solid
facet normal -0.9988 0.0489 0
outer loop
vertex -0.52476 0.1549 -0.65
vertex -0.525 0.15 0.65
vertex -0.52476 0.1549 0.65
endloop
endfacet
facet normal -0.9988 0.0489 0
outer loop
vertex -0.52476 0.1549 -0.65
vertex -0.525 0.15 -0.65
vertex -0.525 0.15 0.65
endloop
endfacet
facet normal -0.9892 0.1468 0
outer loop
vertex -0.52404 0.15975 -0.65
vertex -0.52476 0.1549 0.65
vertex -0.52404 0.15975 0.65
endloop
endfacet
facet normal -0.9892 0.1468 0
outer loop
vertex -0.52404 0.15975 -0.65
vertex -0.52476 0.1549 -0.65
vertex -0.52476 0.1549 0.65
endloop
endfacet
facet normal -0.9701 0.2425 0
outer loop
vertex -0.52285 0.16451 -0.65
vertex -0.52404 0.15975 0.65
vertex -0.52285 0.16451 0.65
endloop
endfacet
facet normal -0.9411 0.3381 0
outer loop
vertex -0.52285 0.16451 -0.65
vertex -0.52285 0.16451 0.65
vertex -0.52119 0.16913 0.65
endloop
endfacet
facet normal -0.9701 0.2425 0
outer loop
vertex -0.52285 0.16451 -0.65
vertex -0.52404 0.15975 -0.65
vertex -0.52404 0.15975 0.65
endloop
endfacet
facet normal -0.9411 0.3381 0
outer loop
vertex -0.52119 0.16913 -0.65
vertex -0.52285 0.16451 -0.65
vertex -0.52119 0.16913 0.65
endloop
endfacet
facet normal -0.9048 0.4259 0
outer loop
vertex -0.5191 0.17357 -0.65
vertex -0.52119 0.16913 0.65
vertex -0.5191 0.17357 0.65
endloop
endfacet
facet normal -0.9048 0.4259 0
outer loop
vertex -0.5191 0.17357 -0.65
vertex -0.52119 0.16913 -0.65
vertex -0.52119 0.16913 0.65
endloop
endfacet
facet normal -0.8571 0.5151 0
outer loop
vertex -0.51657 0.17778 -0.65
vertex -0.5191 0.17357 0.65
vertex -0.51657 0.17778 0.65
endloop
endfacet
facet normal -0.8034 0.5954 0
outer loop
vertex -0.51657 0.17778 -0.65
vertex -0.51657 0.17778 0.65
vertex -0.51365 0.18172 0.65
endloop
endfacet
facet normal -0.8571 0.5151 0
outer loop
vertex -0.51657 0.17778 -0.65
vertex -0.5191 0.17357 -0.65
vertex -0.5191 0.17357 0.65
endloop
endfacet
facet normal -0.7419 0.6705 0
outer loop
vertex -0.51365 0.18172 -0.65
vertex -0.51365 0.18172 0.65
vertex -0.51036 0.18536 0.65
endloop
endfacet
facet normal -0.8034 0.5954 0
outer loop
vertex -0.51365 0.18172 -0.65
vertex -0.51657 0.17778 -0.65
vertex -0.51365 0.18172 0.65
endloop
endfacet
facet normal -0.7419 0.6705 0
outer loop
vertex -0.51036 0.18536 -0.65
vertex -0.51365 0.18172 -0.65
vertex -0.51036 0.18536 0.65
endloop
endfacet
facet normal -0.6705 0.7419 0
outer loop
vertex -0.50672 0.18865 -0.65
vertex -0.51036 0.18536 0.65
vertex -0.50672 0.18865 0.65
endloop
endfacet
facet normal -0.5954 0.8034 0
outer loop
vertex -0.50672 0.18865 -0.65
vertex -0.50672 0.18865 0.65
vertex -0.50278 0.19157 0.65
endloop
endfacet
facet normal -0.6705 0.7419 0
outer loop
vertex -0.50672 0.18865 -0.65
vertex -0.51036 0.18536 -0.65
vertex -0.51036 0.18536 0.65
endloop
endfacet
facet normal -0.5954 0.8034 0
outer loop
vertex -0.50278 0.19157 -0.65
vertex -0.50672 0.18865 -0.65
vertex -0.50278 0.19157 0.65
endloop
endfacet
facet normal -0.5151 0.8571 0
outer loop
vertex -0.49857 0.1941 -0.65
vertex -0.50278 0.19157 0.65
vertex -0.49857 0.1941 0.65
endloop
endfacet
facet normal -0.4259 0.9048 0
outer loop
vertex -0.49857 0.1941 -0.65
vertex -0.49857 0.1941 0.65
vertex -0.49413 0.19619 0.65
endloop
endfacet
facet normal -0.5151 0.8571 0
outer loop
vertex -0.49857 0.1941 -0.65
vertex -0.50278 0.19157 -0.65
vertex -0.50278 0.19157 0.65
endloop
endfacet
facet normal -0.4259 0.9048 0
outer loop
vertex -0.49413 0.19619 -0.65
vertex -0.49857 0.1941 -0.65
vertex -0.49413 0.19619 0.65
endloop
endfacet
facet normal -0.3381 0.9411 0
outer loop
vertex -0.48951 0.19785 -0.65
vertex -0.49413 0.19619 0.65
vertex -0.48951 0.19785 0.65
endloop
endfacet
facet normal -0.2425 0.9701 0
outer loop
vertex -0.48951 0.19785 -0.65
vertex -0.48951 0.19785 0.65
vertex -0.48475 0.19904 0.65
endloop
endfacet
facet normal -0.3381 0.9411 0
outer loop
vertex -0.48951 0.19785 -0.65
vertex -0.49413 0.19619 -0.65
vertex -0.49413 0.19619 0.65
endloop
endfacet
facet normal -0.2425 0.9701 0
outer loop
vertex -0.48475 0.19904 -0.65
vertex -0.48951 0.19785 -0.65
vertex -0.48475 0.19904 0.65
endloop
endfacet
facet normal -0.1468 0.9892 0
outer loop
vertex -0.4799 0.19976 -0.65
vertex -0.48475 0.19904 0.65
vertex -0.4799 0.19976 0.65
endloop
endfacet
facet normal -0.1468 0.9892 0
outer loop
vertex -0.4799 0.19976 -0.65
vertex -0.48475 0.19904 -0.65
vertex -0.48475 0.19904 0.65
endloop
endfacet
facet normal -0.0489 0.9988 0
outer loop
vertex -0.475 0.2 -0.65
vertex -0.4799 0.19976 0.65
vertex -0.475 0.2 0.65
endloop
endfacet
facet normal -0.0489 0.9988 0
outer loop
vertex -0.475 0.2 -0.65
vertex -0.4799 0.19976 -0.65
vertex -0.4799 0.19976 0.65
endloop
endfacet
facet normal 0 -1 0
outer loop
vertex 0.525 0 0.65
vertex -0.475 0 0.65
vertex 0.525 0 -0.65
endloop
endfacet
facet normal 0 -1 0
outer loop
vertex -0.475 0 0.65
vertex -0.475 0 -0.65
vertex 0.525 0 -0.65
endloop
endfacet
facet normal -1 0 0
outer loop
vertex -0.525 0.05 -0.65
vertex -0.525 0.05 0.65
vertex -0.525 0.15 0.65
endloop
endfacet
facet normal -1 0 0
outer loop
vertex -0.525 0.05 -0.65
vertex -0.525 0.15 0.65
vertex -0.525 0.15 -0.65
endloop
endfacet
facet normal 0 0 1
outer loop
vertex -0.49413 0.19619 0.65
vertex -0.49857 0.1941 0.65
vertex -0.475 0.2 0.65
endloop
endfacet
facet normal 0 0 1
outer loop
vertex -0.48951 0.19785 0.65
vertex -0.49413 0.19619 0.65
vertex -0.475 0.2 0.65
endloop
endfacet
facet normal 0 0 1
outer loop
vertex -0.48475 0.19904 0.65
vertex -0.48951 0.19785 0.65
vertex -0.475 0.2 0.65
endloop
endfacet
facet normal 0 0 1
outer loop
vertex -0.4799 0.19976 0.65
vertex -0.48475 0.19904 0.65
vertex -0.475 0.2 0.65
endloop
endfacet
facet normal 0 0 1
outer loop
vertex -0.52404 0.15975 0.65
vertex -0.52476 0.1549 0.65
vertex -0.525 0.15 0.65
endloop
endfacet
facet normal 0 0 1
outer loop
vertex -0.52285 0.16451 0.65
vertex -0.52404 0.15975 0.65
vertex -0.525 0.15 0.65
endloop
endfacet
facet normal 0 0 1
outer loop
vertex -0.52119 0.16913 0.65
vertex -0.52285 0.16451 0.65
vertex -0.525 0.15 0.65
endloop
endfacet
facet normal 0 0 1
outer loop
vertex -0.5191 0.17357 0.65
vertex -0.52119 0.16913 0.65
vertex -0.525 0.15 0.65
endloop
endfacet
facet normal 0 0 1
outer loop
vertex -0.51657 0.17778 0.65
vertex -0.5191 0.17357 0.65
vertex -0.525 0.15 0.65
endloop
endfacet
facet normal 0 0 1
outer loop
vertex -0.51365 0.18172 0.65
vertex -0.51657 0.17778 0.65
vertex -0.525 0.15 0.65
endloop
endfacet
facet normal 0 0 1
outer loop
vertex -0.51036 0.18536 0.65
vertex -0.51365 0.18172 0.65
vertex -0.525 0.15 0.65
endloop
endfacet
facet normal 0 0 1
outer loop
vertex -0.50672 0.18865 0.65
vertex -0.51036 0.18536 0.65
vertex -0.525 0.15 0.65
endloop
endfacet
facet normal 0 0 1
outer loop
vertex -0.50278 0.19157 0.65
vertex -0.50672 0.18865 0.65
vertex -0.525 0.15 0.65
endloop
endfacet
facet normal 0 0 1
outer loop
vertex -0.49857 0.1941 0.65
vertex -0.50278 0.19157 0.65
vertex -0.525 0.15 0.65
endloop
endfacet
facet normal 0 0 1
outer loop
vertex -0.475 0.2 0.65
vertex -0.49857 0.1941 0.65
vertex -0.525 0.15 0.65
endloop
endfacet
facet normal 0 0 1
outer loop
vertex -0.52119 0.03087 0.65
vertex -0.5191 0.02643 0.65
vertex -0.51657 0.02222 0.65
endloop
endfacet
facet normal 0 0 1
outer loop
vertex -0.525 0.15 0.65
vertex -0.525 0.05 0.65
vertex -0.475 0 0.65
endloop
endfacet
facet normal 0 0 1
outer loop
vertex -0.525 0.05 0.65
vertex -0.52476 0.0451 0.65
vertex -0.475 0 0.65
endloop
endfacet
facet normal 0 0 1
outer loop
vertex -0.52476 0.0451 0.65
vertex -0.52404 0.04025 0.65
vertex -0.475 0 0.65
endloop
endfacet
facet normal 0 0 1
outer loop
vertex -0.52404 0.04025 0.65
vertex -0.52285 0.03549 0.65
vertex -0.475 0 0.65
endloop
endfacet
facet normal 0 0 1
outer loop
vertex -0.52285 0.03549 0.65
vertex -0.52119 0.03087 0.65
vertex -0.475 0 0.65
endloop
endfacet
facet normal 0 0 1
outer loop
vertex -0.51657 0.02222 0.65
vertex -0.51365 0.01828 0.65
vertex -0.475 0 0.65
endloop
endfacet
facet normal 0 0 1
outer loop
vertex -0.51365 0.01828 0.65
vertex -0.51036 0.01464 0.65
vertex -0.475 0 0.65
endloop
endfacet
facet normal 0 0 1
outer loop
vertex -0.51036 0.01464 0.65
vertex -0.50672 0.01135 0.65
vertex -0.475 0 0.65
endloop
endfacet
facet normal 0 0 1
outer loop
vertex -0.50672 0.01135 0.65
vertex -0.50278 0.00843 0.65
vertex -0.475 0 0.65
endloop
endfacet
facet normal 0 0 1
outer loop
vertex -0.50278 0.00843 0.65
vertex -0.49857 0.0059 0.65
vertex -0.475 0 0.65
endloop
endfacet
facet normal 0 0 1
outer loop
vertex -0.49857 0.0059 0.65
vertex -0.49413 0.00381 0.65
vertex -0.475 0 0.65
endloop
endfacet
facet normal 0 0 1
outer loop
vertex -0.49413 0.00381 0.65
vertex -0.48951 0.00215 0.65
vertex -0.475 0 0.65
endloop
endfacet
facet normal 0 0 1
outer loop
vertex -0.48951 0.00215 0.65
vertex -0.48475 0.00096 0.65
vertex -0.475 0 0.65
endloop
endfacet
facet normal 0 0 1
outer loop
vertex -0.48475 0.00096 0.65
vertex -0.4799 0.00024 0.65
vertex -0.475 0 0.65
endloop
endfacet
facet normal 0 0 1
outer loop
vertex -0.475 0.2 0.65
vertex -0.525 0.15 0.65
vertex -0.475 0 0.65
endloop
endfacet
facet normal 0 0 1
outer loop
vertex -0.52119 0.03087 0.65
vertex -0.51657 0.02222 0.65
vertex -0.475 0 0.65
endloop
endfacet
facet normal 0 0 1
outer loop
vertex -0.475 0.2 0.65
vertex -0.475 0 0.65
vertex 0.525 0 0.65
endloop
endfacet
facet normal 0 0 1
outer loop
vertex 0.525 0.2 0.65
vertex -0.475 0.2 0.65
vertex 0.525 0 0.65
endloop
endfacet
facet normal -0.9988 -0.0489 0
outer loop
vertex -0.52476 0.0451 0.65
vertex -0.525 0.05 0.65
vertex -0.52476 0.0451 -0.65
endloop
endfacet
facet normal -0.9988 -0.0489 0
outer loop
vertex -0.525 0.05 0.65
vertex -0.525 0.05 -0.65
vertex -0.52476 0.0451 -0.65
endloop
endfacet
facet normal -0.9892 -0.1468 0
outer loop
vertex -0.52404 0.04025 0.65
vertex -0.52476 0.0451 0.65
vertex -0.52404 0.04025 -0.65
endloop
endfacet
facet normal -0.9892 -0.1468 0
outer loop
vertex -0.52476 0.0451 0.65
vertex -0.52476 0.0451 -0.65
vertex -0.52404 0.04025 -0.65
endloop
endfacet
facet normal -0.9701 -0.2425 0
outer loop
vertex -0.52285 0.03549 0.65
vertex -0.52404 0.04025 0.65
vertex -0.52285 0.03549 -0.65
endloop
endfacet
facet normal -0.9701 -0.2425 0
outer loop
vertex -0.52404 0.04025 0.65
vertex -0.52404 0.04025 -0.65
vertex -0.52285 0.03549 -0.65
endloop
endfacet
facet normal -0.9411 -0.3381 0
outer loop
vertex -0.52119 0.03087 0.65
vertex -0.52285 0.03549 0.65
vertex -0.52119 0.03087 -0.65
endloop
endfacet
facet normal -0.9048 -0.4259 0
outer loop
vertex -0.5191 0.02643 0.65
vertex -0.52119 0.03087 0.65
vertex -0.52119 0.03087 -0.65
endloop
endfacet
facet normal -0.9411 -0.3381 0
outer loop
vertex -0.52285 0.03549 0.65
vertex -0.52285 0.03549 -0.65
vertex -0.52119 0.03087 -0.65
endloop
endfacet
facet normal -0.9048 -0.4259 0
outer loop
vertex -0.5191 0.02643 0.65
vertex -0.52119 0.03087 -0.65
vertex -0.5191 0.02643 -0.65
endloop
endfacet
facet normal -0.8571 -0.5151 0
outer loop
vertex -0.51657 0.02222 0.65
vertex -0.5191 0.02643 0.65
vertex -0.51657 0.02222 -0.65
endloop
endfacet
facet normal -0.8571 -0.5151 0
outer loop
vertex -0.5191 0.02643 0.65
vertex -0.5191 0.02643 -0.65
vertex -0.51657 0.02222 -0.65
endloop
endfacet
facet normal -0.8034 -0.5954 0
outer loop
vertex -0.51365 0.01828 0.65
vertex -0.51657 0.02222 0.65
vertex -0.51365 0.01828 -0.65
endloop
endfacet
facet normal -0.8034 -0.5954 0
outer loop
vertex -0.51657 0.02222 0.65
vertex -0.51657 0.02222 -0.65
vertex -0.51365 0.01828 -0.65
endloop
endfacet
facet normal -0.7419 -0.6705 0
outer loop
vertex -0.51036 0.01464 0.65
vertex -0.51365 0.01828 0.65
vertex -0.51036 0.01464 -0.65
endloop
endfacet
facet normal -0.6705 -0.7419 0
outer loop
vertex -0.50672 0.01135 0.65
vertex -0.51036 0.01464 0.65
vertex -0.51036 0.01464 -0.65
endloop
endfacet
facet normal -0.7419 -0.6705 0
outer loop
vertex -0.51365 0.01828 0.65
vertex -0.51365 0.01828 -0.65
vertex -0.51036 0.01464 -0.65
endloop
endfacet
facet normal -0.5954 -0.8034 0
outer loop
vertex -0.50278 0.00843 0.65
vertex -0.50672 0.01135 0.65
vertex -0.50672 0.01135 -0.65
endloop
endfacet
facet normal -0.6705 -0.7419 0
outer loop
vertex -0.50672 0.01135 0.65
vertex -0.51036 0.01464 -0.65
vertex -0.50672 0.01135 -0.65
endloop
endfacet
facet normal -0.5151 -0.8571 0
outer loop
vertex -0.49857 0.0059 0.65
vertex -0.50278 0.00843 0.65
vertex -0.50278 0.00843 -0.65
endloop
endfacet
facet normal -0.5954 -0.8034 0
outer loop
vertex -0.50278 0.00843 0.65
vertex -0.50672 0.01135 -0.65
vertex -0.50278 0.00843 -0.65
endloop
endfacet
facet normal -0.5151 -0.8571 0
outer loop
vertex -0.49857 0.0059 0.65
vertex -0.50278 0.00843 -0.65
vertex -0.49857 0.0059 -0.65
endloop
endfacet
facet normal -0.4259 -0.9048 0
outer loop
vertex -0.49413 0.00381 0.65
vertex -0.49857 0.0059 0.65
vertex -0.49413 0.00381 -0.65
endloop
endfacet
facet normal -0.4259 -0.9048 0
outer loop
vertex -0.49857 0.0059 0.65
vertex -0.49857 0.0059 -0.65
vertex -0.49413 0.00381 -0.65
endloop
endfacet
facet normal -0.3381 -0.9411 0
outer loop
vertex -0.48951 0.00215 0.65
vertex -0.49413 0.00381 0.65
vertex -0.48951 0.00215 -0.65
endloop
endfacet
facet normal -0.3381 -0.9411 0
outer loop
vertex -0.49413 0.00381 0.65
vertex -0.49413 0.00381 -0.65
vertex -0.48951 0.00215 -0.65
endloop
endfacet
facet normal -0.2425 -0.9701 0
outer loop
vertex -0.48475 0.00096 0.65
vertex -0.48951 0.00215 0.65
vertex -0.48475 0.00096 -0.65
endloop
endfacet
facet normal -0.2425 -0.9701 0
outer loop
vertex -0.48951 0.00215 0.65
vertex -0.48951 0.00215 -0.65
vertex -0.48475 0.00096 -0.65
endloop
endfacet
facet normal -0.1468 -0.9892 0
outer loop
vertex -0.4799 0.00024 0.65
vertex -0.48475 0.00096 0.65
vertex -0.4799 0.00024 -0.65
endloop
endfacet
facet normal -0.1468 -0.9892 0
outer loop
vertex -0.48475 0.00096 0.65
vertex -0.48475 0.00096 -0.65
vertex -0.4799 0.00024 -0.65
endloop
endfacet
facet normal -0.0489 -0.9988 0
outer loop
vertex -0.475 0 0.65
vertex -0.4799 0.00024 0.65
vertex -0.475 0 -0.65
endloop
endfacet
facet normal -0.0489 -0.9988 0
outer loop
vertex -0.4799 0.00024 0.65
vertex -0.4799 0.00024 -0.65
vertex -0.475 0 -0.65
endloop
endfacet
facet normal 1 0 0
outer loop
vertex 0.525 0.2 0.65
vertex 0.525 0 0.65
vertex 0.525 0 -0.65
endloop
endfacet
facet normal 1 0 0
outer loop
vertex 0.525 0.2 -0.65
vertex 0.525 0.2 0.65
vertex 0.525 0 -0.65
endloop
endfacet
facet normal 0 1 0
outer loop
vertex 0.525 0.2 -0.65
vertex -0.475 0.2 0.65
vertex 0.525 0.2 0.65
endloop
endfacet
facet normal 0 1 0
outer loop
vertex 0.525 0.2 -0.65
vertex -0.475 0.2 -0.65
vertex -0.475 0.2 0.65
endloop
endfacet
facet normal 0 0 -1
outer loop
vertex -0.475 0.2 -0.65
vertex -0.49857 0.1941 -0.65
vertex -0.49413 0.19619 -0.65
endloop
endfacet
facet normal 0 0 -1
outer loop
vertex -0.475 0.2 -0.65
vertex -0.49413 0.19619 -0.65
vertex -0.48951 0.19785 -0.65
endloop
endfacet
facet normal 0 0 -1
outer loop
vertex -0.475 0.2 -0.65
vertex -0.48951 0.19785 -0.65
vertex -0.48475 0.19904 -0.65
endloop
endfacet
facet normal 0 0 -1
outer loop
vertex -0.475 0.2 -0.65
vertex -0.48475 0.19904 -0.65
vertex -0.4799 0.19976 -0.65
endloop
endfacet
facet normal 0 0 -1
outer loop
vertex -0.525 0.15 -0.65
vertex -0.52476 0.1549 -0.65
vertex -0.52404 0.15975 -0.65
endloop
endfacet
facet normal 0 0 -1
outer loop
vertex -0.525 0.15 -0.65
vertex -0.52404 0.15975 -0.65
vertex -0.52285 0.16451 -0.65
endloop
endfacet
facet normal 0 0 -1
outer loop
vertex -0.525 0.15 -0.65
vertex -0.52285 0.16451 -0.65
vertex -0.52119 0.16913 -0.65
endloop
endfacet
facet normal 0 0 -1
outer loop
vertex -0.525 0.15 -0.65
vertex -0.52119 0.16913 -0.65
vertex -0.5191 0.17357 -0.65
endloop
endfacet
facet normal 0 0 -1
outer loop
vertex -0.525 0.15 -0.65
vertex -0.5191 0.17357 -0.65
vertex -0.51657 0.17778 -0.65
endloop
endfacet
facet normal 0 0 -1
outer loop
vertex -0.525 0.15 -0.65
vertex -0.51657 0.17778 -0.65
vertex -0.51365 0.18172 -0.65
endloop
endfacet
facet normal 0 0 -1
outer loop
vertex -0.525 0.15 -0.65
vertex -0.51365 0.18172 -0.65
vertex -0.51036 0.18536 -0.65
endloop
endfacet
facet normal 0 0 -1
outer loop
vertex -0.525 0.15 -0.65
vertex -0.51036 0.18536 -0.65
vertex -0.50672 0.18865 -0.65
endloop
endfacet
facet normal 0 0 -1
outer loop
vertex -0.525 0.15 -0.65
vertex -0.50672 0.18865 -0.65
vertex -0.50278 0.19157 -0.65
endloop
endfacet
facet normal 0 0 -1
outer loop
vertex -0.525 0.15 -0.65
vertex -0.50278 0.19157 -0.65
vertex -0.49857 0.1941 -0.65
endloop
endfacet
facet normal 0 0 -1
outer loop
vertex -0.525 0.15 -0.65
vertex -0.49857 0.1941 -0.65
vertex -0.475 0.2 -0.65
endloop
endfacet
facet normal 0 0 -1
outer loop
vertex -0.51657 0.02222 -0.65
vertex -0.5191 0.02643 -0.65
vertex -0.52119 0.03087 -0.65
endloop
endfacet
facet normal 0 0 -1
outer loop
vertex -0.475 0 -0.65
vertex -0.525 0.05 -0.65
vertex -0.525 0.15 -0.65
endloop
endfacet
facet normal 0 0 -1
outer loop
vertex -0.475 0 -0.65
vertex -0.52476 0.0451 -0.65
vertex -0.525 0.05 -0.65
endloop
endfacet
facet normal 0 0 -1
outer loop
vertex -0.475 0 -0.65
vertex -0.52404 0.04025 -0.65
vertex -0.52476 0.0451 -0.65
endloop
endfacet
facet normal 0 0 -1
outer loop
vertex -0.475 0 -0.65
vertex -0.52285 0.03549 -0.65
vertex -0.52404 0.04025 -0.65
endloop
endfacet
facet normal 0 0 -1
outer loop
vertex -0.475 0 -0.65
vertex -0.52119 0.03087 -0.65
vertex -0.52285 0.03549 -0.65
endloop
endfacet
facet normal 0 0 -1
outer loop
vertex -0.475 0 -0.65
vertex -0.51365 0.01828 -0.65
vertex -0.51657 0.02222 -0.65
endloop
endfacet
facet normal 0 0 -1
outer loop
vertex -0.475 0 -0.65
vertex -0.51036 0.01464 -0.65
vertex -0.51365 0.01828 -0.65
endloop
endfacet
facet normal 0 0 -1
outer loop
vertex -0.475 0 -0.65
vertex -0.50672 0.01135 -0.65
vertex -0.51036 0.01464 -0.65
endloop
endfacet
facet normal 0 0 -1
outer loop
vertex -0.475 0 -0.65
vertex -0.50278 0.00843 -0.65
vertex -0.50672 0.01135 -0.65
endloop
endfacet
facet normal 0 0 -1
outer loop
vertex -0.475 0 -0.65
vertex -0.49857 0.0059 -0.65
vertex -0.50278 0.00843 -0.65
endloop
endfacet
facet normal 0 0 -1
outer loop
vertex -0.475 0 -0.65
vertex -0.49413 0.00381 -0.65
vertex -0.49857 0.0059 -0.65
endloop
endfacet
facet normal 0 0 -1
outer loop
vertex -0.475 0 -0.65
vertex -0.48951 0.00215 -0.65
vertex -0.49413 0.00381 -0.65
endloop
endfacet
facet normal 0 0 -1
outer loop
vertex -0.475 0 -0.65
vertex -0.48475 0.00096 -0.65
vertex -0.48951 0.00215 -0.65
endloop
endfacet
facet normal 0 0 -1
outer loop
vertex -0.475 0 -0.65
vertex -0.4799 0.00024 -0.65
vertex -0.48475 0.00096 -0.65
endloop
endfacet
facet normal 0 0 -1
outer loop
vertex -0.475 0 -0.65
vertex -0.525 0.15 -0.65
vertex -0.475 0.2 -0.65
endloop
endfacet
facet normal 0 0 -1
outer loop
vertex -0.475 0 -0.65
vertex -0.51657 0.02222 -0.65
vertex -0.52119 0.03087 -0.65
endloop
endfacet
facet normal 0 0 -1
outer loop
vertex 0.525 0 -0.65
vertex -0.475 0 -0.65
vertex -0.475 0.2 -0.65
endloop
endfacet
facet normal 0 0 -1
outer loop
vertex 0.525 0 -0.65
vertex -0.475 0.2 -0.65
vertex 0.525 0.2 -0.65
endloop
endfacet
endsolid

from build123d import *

# Parameters (mm, degrees)
SKETCH_1_W      = 1.05
SKETCH_1_H      = 1.3
EXTRUDE_1_DEPTH = 0.2
FILLET_5_R      = 0.05
FILLET_6_R      = 0.05


with BuildPart() as part:
    # 草图1 → 凸台-拉伸1 (new body)
    with BuildSketch(Plane(origin=(0, 0, 0), x_dir=(1, 0, 0), z_dir=(0, 1, 0))):
        Rectangle(SKETCH_1_W, SKETCH_1_H)
    extrude(amount=EXTRUDE_1_DEPTH)

    # 圆角5
    fillet_5_edges = [part.edges().sort_by_distance(p)[0] for p in [
        (-0.525, 0.2, 0),
    ]]
    fillet(fillet_5_edges, radius=FILLET_5_R)

    # 圆角6
    fillet_6_edges = [part.edges().sort_by_distance(p)[0] for p in [
        (-0.525, 0, 0),
    ]]
    fillet(fillet_6_edges, radius=FILLET_6_R)


solid = part.part
